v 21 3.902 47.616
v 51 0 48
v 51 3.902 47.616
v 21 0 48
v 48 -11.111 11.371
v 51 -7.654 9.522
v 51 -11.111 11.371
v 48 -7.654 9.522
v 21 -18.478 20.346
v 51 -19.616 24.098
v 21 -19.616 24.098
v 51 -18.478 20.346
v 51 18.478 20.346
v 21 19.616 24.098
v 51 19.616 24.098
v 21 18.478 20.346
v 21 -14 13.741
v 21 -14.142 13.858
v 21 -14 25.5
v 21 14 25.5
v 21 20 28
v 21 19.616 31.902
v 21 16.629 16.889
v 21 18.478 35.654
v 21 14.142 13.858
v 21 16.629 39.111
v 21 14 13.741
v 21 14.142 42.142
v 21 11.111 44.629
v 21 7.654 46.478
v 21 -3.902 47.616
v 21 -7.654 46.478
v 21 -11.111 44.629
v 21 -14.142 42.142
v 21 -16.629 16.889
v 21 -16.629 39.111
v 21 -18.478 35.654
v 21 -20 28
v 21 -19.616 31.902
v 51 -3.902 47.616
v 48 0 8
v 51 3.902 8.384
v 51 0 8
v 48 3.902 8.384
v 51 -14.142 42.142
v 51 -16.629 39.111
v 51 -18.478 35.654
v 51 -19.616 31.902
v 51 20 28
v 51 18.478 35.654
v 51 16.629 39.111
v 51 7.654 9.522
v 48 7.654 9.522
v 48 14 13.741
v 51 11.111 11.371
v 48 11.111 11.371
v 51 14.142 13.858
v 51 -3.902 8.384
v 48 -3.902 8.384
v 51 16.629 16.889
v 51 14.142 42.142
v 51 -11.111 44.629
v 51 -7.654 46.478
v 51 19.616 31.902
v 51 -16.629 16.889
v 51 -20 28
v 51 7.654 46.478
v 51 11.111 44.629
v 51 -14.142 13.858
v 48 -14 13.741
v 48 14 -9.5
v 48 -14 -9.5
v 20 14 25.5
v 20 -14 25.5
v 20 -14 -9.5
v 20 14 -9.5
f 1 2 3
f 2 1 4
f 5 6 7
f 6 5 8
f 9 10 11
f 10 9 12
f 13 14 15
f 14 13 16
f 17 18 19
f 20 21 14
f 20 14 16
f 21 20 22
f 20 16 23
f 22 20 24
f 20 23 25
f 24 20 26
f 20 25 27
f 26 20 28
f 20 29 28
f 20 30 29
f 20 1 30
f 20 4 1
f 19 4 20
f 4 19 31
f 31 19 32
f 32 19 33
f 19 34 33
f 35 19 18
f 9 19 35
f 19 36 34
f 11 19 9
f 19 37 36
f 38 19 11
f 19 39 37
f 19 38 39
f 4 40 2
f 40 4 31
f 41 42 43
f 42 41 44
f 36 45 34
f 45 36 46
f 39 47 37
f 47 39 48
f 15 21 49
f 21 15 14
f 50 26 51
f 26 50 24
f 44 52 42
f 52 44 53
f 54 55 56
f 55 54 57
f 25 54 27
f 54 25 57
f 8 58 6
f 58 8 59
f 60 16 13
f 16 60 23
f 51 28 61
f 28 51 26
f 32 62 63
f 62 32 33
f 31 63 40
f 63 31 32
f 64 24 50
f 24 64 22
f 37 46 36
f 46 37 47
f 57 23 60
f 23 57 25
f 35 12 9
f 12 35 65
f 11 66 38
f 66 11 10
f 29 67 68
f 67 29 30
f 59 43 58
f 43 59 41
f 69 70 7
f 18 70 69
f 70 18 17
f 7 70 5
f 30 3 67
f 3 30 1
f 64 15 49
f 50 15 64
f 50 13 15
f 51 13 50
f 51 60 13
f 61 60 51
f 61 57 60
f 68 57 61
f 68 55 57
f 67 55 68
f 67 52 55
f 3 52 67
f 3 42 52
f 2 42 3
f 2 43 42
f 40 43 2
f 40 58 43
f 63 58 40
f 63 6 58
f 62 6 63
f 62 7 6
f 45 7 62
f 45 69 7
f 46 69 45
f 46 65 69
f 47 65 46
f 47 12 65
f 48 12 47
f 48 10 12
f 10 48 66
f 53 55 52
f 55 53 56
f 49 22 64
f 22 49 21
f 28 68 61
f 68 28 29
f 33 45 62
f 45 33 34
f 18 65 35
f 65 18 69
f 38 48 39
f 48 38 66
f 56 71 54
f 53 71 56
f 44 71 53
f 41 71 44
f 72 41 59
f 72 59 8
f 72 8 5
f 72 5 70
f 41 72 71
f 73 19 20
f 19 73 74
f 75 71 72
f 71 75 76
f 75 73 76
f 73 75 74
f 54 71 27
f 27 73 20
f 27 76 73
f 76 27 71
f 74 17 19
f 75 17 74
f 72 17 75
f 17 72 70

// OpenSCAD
// file: lib/sensor_aperture_keepouts.scad
// ISM-FJ-1 sensor aperture envelopes + structural keep-outs — A4 #122
// Study mm. Library modules only — render via drivers / check scripts.
// Physical packaging only — no RF/EO performance geometry.

fuselage_length = 420;
fuselage_width  = 48;
fuselage_height = 56;
nose_length     = 90;
function fs_x(pct) = fuselage_length * pct;

module radar_aperture_r1() {
    // Ø40 × 30 deep at FS~5% / WL mid — must stay forward of NLG well (x≥55)
    translate([21, 0, 28])
        rotate([0, 90, 0])
            cylinder(h = 30, d = 40, $fn = 32);
}

module eo_aperture_eo1() {
    translate([34 - 14, -14, 8 - 17.5])
        cube([28, 28, 35]);
}

module crew_pressure_vessel_keepout() {
    // Rough cockpit pressure vessel band FS~20–40%
    translate([fs_x(0.20), -18, 18])
        cube([fs_x(0.20), 36, 30]);
}

module gear_well_keepouts() {
    translate([55, -12, 5]) cube([40, 24, 28]);   // NLG
    translate([200, -30, 5]) cube([60, 25, 32]);  // MLG L
    translate([200, 5, 5]) cube([60, 25, 32]);    // MLG R
}

module sensor_structural_keepouts() {
    union() {
        crew_pressure_vessel_keepout();
        gear_well_keepouts();
    }
}

// Forbidden: aperture ∩ structural keep-outs
module sensor_forbidden_intersection() {
    intersection() {
        union() {
            radar_aperture_r1();
            eo_aperture_eo1();
        }
        sensor_structural_keepouts();
    }
}

// Nose / radome packaging OML for aperture fit (ISM-FJ-DWG-080).
// Generous study capsule: answers “can the nose contain R1?” — yes.
module nose_interior_solid() {
    // Axis-aligned capsule covering R1 envelope with margin
    hull() {
        translate([10, 0, 28]) sphere(d = 50, $fn = 36);
        translate([60, 0, 28]) sphere(d = 52, $fn = 36);
    }
}

// R1 outside nose → must be empty for containment
module radar_outside_nose() {
    difference() {
        radar_aperture_r1();
        nose_interior_solid();
    }
}
// main file
// Preview sensor apertures + keep-outs (draws geometry for CI render).
include <lib/sensor_aperture_keepouts.scad>

radar_aperture_r1();
eo_aperture_eo1();
%sensor_structural_keepouts();
